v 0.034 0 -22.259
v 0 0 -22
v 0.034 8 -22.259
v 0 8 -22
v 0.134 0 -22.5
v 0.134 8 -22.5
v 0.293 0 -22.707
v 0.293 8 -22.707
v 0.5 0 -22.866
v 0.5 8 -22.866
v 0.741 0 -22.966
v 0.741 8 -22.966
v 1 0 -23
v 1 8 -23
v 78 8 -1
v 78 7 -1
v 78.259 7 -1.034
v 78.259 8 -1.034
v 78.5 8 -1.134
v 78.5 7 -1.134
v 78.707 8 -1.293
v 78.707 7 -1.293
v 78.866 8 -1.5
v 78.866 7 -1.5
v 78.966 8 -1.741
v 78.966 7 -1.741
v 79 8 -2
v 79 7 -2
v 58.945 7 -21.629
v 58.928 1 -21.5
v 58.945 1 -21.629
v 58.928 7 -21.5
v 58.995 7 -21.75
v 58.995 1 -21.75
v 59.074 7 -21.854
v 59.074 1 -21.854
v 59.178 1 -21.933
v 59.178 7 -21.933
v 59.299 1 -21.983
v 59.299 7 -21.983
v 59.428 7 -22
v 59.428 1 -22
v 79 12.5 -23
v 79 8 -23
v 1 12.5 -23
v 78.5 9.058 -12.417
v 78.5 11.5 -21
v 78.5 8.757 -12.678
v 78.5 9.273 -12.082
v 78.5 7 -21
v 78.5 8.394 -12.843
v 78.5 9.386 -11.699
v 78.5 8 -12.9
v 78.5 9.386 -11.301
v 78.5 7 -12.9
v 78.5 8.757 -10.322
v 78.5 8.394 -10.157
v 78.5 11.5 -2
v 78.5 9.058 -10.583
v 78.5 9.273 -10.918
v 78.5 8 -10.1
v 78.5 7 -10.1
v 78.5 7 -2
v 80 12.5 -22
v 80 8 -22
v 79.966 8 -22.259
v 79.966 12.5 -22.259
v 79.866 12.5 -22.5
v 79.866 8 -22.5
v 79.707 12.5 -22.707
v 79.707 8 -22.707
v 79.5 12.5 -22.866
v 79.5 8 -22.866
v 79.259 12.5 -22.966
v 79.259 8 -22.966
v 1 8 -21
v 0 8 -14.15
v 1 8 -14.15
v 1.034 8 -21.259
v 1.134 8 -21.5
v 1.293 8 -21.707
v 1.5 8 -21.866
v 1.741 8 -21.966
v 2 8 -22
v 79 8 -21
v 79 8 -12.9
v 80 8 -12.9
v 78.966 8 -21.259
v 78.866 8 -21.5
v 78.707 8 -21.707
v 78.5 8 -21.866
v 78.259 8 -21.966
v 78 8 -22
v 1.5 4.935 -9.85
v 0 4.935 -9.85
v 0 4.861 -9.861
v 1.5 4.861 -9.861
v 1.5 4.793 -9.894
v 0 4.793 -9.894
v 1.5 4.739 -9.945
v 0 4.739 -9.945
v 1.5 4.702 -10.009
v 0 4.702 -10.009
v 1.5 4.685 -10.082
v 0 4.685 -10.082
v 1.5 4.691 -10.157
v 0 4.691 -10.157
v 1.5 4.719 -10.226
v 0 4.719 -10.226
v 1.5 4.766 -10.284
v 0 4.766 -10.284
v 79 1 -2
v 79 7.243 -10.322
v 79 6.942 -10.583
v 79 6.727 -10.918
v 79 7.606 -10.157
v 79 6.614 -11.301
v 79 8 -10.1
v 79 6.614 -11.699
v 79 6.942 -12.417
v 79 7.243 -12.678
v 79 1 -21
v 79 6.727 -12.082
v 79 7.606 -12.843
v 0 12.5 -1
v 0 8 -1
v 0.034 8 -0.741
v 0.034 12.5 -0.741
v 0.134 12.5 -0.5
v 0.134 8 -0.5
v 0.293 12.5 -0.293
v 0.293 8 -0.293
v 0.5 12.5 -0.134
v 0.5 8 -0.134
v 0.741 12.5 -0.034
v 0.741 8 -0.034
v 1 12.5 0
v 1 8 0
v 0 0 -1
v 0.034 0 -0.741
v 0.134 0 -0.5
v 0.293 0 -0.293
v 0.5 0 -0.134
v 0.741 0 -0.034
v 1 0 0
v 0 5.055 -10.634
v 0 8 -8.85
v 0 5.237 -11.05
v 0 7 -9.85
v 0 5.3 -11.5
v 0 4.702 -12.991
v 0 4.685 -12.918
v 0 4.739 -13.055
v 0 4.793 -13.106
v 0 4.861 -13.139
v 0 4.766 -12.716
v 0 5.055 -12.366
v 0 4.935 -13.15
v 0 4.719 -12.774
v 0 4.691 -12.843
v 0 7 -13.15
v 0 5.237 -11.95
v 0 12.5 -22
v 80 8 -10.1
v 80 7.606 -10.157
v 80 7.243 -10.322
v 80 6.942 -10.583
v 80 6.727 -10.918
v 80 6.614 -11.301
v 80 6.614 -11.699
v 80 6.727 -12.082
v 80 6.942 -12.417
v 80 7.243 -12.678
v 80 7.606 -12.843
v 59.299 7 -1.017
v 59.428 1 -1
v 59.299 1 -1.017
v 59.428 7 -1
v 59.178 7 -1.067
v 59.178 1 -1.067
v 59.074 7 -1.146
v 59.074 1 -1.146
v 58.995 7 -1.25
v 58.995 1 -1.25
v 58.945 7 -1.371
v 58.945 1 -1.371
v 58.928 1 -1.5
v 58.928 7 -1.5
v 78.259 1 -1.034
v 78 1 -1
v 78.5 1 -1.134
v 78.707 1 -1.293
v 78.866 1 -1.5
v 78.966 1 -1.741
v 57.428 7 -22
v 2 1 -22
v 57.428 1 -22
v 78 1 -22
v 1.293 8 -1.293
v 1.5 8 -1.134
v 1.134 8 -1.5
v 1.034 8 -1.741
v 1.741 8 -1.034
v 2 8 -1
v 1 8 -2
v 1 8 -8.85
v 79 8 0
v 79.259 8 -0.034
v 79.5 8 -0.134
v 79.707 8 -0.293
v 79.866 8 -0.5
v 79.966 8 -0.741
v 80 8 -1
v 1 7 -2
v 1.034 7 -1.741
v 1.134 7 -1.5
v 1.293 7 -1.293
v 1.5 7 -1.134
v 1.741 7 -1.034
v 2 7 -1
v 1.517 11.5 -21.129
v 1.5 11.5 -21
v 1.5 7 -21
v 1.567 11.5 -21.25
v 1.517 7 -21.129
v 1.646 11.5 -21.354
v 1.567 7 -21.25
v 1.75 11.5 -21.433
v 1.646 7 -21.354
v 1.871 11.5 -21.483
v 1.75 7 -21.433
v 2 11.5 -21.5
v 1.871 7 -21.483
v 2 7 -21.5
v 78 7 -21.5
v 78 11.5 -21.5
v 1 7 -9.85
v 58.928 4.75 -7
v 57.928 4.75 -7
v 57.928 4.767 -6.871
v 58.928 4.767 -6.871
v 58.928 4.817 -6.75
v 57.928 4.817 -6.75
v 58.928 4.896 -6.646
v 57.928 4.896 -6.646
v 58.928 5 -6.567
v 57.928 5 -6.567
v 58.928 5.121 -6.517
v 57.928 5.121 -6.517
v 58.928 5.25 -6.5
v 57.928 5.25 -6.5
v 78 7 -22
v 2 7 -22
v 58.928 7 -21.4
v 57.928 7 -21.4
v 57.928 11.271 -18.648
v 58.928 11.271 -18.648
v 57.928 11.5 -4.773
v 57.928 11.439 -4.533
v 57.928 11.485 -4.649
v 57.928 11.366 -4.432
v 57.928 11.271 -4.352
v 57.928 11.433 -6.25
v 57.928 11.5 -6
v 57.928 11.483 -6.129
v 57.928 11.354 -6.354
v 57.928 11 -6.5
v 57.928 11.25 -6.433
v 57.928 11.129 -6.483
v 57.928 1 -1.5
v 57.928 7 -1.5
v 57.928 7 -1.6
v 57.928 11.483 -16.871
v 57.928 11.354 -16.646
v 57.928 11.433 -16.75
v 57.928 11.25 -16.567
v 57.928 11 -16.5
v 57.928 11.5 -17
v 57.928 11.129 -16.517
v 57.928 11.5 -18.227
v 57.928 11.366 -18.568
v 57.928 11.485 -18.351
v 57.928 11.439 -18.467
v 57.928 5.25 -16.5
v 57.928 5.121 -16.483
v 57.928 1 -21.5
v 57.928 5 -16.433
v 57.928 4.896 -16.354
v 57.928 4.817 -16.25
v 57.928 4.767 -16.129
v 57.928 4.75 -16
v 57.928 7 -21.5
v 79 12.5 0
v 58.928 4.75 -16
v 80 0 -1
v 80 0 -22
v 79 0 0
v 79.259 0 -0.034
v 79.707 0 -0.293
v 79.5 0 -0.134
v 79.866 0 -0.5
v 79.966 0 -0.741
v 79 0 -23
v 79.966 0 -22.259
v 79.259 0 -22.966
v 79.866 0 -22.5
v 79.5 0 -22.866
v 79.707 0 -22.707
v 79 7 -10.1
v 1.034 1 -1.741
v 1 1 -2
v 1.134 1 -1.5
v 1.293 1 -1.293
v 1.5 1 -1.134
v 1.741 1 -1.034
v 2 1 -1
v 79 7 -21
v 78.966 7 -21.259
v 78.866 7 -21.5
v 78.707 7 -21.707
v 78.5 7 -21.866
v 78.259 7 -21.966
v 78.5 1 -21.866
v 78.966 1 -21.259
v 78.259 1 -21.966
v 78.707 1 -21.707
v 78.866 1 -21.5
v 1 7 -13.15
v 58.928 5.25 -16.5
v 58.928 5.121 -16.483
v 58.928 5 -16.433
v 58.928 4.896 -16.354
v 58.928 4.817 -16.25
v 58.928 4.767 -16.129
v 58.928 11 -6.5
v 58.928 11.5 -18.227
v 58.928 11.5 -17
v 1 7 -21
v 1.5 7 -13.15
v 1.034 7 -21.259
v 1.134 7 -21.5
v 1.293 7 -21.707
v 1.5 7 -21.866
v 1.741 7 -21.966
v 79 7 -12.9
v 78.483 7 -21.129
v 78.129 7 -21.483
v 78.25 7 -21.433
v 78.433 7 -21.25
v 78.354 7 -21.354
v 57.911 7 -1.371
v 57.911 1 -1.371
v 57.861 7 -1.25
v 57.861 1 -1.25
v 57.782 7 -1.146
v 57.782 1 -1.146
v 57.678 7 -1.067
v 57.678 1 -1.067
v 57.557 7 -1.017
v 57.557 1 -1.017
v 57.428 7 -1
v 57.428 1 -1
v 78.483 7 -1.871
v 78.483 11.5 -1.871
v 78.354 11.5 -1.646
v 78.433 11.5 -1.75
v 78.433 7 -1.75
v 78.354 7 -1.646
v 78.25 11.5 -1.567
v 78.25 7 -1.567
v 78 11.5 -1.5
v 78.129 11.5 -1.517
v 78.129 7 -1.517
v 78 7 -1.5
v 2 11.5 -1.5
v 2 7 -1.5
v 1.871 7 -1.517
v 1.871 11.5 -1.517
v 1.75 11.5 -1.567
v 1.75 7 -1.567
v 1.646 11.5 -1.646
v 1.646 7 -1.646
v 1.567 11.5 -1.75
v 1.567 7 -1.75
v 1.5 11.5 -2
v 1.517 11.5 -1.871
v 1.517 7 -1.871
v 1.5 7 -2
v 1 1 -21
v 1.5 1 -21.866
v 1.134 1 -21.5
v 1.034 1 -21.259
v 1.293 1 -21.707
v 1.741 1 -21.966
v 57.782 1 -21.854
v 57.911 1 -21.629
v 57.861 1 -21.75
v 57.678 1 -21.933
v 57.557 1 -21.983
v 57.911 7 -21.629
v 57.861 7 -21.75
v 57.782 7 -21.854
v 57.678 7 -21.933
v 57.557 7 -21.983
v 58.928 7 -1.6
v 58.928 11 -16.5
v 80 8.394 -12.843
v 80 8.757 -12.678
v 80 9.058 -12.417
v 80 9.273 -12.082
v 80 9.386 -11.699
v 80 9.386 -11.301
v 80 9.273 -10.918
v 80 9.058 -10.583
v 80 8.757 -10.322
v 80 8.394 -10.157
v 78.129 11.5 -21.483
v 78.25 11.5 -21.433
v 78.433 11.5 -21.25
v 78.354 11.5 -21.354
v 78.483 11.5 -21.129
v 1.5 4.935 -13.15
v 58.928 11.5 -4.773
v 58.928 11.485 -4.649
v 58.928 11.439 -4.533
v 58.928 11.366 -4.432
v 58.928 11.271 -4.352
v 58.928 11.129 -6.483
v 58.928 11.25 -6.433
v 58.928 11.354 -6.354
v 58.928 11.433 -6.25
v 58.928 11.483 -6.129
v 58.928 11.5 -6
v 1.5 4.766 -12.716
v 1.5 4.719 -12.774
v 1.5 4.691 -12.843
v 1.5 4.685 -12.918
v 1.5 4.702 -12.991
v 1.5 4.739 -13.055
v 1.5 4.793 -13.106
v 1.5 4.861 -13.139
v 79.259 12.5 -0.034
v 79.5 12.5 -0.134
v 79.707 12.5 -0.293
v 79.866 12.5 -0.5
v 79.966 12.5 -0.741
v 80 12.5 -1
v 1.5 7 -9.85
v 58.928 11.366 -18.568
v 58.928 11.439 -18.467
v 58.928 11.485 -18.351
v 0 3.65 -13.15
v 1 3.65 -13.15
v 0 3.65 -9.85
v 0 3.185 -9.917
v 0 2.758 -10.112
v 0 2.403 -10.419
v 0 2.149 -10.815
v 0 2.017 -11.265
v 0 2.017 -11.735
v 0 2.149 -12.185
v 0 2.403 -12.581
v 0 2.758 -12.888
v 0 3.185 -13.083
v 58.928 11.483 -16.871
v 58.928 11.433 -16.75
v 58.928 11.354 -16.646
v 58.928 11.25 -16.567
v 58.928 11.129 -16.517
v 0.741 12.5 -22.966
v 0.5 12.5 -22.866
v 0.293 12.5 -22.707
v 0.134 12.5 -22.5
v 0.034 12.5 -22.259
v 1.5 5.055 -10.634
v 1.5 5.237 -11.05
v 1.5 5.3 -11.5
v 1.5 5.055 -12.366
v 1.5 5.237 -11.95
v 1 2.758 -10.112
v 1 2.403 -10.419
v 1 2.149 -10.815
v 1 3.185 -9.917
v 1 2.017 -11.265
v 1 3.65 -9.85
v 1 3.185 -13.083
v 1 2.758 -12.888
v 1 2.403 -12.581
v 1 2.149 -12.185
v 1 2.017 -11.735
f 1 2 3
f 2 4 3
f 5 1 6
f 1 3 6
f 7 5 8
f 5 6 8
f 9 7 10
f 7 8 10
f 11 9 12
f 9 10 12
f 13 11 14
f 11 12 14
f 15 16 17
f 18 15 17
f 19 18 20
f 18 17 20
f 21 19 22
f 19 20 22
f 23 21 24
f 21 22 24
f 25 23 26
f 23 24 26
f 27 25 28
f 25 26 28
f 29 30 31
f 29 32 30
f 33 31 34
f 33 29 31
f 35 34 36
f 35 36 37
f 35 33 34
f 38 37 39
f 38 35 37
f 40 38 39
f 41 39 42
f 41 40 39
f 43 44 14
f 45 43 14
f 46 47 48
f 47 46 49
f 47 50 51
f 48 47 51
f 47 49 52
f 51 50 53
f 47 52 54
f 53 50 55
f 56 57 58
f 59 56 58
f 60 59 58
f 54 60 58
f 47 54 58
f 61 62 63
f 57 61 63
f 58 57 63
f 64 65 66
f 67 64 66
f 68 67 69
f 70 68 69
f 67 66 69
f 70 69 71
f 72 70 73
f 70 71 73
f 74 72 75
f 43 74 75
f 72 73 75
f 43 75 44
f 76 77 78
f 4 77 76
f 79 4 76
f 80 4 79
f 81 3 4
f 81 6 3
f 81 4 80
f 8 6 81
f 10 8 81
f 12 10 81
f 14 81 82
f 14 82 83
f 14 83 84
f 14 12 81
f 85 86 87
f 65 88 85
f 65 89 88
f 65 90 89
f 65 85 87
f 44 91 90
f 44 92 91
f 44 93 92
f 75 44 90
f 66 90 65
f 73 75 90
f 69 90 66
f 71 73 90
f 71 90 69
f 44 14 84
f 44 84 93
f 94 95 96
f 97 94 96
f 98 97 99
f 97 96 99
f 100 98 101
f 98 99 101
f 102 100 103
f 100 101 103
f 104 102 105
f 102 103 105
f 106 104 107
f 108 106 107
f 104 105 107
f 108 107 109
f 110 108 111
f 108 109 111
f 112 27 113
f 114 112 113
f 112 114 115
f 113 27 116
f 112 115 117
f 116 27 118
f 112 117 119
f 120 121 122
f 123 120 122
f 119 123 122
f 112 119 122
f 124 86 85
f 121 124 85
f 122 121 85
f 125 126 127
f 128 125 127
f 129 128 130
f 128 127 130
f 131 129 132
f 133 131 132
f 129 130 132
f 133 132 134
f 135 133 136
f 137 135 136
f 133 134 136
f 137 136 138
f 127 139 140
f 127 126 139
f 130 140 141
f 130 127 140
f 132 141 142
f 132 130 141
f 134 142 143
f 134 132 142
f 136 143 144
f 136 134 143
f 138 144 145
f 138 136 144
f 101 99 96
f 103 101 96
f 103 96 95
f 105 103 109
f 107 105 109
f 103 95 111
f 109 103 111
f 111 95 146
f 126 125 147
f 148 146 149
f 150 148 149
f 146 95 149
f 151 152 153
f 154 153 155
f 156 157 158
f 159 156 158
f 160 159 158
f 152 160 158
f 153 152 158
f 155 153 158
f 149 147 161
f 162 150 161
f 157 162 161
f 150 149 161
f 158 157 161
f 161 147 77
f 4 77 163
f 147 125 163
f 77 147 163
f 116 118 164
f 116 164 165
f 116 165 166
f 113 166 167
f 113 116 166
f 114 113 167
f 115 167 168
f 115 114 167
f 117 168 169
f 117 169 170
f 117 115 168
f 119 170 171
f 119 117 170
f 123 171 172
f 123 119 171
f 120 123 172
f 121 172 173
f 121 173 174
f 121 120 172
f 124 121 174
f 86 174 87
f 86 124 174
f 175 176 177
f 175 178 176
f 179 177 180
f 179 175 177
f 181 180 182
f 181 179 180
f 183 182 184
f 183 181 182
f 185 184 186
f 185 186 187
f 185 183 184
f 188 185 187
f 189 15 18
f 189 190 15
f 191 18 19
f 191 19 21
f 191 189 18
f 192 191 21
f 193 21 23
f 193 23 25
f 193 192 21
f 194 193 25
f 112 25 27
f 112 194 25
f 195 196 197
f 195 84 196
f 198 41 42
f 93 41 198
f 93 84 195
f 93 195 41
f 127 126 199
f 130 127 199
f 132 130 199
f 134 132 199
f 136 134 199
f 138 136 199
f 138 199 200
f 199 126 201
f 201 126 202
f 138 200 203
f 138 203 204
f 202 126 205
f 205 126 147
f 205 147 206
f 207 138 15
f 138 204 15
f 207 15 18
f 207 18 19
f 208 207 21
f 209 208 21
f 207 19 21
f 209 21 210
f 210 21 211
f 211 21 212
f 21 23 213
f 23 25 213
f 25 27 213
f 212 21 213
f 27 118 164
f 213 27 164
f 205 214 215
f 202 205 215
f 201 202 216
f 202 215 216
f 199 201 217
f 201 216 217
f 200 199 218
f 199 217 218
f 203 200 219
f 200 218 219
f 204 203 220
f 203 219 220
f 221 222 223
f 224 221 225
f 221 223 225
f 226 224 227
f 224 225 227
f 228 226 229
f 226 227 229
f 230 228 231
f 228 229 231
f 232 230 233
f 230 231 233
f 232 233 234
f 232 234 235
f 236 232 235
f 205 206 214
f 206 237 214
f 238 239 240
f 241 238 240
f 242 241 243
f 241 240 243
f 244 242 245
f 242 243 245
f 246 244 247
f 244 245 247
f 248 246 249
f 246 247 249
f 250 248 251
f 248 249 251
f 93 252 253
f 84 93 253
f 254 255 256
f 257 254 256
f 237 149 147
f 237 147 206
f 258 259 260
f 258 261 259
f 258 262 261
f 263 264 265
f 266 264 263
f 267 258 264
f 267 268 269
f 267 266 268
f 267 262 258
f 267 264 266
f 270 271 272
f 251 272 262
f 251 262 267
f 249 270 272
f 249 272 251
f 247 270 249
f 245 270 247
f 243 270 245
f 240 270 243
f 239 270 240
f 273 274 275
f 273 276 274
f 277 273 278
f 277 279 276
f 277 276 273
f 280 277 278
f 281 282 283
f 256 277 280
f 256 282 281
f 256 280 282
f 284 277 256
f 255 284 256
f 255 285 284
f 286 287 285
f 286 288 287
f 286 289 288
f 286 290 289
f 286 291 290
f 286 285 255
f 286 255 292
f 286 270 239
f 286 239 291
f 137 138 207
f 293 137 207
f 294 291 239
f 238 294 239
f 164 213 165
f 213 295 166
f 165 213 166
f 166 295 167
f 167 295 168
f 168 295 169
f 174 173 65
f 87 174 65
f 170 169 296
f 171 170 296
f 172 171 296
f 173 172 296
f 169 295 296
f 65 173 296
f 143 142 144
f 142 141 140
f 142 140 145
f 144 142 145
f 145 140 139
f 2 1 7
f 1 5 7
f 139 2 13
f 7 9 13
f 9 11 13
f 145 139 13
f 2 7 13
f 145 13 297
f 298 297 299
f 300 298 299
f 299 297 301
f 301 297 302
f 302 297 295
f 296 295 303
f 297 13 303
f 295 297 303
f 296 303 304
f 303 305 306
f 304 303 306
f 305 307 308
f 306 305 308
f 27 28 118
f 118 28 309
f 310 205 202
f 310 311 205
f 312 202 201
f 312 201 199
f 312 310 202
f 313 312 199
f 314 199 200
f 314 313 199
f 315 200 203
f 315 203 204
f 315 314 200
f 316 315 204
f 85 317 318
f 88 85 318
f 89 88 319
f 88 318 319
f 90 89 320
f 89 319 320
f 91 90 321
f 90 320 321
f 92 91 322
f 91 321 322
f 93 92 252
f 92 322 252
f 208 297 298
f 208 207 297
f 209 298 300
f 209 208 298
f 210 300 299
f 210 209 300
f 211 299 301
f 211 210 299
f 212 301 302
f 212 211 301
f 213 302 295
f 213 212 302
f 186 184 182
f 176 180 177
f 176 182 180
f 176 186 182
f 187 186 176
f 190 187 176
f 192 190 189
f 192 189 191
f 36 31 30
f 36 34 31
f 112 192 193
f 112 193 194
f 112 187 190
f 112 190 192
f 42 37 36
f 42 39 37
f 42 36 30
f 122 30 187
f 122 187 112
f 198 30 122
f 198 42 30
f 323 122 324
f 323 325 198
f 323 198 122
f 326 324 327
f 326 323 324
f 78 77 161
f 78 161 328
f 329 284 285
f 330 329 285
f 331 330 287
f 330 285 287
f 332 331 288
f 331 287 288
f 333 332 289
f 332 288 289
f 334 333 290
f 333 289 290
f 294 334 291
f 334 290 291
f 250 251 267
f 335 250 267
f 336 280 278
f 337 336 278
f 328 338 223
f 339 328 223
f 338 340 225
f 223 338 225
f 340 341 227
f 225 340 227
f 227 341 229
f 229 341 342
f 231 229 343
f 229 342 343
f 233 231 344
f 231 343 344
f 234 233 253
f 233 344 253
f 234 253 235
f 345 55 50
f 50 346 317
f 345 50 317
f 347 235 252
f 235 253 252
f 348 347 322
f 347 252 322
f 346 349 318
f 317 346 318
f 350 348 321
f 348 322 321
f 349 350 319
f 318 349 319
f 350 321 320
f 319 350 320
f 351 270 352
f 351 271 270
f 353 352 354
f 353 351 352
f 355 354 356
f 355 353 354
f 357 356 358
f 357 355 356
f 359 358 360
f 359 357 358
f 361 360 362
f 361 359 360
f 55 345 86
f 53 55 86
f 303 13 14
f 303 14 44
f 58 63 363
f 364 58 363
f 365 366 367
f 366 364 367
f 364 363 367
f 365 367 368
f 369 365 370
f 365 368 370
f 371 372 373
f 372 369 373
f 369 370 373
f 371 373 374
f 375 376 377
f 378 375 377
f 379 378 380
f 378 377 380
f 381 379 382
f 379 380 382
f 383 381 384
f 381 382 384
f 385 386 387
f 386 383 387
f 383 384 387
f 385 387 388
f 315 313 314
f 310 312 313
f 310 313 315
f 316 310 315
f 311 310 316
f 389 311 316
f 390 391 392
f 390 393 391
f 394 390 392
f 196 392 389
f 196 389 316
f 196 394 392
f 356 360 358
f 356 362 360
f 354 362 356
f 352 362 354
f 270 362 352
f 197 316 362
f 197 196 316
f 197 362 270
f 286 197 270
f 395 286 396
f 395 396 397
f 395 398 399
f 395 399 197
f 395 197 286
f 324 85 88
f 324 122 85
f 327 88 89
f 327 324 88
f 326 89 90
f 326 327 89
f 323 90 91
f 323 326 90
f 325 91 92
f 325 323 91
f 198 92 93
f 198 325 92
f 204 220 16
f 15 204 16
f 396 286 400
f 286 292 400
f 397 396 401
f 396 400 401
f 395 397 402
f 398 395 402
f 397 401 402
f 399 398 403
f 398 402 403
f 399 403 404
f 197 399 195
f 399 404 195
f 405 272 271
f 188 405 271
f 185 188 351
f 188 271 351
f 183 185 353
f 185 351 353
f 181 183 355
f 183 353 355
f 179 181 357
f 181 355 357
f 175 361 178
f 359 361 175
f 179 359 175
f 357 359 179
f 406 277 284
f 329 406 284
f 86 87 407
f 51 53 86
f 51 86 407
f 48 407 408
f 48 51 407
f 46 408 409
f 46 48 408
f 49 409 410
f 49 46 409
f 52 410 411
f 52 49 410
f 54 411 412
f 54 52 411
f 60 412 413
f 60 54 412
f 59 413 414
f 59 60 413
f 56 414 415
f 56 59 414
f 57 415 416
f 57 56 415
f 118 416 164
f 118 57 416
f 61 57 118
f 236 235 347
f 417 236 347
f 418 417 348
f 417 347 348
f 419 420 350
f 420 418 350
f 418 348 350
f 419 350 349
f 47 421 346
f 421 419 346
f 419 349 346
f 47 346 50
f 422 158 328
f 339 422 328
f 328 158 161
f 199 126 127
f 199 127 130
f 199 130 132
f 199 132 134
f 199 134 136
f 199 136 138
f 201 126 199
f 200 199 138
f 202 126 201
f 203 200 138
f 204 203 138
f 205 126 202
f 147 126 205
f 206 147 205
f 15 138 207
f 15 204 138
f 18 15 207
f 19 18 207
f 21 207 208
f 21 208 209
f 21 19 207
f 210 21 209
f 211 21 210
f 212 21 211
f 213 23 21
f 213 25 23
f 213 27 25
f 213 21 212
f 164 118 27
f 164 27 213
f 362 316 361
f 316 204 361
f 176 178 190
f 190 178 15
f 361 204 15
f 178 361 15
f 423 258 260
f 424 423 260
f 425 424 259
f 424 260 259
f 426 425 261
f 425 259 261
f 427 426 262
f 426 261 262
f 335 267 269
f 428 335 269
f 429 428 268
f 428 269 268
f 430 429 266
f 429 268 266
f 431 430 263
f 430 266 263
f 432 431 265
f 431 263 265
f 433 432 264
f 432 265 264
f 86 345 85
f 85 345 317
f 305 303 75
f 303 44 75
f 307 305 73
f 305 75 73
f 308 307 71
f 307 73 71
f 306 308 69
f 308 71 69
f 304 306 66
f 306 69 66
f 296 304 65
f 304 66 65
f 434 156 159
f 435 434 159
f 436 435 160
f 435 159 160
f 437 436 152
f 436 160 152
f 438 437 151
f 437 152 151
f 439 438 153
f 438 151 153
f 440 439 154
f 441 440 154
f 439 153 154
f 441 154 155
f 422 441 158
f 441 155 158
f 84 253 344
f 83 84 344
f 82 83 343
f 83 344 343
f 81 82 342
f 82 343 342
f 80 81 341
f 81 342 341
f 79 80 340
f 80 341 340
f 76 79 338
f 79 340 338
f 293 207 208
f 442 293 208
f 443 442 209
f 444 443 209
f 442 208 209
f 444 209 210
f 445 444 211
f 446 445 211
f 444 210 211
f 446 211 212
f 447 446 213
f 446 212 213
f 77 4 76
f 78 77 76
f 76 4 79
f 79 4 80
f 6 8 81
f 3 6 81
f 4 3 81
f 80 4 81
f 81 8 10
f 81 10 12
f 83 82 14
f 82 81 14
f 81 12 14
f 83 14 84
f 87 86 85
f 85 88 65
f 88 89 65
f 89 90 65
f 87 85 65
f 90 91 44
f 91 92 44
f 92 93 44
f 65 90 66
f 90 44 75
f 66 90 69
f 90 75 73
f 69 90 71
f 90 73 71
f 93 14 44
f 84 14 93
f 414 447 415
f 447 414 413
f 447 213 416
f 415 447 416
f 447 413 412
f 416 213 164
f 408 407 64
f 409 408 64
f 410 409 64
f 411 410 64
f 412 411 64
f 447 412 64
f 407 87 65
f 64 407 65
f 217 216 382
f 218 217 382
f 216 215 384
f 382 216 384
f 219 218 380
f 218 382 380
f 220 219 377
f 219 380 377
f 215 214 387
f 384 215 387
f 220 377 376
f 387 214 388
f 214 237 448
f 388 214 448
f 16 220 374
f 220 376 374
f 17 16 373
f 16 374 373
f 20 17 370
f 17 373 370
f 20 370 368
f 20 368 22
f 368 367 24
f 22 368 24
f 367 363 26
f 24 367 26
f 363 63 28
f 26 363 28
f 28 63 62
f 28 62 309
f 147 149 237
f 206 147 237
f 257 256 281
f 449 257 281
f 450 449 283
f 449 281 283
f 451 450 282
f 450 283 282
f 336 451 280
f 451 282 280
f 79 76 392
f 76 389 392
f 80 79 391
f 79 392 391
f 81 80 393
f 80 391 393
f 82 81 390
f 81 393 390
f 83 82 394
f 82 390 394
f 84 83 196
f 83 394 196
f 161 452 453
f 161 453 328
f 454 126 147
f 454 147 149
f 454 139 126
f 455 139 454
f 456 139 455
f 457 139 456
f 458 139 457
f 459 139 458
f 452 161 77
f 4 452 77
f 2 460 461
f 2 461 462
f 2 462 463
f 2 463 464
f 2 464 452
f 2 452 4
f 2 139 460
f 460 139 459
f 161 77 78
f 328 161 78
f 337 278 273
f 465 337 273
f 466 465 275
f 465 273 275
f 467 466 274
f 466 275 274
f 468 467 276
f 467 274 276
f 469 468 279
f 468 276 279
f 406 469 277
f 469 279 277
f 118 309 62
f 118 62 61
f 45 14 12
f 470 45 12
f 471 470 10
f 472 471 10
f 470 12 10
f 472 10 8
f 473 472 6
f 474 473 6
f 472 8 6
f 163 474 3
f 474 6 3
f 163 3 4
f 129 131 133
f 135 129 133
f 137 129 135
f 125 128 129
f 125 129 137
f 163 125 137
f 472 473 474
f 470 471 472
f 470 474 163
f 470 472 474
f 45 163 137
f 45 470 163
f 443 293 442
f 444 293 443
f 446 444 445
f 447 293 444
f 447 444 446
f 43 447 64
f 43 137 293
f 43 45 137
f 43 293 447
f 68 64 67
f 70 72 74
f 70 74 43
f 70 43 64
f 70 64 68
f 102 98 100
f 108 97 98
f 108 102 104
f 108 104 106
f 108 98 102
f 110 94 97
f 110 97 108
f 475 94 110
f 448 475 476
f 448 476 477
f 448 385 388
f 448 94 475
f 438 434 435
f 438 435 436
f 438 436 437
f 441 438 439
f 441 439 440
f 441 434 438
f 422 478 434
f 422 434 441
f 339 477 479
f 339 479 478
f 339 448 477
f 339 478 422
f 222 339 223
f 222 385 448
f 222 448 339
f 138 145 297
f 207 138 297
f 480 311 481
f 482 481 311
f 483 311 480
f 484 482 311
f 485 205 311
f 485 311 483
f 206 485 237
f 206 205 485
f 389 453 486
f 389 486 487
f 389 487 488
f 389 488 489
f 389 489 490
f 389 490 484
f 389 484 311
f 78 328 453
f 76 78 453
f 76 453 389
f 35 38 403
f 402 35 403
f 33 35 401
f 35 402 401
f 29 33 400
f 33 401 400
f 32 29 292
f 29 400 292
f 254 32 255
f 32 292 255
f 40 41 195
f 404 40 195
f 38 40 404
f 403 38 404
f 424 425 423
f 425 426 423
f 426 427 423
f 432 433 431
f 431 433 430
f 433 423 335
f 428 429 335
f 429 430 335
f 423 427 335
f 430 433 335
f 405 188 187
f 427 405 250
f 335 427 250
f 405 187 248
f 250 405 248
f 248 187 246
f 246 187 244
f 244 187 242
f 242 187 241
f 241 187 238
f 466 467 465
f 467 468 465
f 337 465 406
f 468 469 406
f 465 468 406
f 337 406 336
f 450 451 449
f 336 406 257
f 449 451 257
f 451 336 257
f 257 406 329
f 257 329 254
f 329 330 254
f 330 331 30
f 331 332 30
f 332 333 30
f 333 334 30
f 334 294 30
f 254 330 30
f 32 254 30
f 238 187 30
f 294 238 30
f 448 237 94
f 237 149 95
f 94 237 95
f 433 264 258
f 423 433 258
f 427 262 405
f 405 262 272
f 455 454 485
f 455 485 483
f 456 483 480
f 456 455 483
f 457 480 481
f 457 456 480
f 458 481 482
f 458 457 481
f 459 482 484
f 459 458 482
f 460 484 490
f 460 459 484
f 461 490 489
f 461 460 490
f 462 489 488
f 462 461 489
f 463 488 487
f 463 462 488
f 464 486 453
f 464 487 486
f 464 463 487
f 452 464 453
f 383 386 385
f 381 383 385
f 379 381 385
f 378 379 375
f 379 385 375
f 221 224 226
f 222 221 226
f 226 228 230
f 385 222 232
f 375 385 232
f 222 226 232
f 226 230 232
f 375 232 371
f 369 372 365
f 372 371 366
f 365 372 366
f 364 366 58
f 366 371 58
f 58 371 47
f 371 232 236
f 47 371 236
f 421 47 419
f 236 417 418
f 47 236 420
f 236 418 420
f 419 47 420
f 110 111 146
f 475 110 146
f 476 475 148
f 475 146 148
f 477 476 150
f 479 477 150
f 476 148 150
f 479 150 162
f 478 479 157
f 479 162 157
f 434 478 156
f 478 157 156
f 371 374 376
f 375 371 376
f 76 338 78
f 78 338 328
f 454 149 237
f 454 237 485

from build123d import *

# Parameters (mm, degrees)
SKETCH1_W           = 80
SKETCH1_H           = 23
BOSS_EXTRUDE1_DEPTH = 8
SKETCH2_W           = 78
SKETCH2_H           = 21
CUT_EXTRUDE1_DEPTH  = 7
CUT_EXTRUDE2_REACH  = 85.624
FILLET1_R           = 1
BOSS_EXTRUDE3_DEPTH = 4.5
CUT_EXTRUDE4_DEPTH  = 3.5
BOSS_EXTRUDE4_START = -1
BOSS_EXTRUDE4_DEPTH = 1
CUT_EXTRUDE3_START  = -1.5
SKETCH4_R           = 1.4
CUT_EXTRUDE3_DEPTH  = 1.5
BOSS_EXTRUDE5_DEPTH = 1.5
SKETCH4_3_W         = 2.8
SKETCH4_3_H         = 1.4
CUT_EXTRUDE19_DEPTH = 1.5
CHAMFER2_SIZE       = 1
CHAMFER3_SIZE       = 1
SKETCH7_W           = 1
SKETCH7_H           = 21
BOSS_EXTRUDE6_DEPTH = 10.5
CUT_EXTRUDE20_DEPTH = 1
FILLET2_R           = 0.5


with BuildPart() as part:
    # Sketch1 → Boss-Extrude1 (new body)
    with BuildSketch(Plane(origin=(0, 0, 0), x_dir=(1, 0, 0), z_dir=(0, 1, 0))):
        with Locations((40, 11.5)):
            Rectangle(SKETCH1_W, SKETCH1_H)
    extrude(amount=BOSS_EXTRUDE1_DEPTH)

    # Sketch2 → Cut-Extrude1 (cut)
    with BuildSketch(Plane(origin=(0, 8, 0), x_dir=(1, 0, 0), z_dir=(0, 1, 0))):
        with Locations((40, 11.5)):
            Rectangle(SKETCH2_W, SKETCH2_H)
    extrude(amount=-CUT_EXTRUDE1_DEPTH, mode=Mode.SUBTRACT)

    # Sketch3 → Cut-Extrude2 (cut, up to next)
    with BuildSketch(Plane(origin=(0, 0, 0), x_dir=(0, 0, -1), z_dir=(1, 0, 0)), mode=Mode.PRIVATE) as cut_extrude2_sk1:
        with BuildLine():
            ThreePointArc((12.715789474, 4.76550704), (12.990684531, 4.701550479), (13.15, 4.934523258))
            Line((13.15, 4.934523258), (13.15, 8))
            Line((13.15, 8), (9.85, 8))
            Line((9.85, 8), (9.85, 4.934523258))
            ThreePointArc((9.85, 4.934523258), (10.009315469, 4.701550479), (10.284210526, 4.76550704))
            ThreePointArc((10.284210526, 4.76550704), (11.5, 5.3), (12.715789474, 4.76550704))
        make_face()
    cut_extrude2_tool1 = extrude(cut_extrude2_sk1.sketch, amount=CUT_EXTRUDE2_REACH, mode=Mode.PRIVATE) & part.part
    # Sketch3 → Cut-Extrude2 (cut, up to next)
    with BuildSketch(Plane(origin=(0, 0, 0), x_dir=(0, 0, -1), z_dir=(1, 0, 0)), mode=Mode.PRIVATE) as cut_extrude2_sk2:
        with BuildLine():
            ThreePointArc((12.715789474, 4.76550704), (13.037620342, 4.248517906), (13.15, 3.65))
            Line((13.15, 3.65), (13.15, 4.934523258))
            ThreePointArc((13.15, 4.934523258), (12.990684531, 4.701550479), (12.715789474, 4.76550704))
        make_face()
    cut_extrude2_tool2 = extrude(cut_extrude2_sk2.sketch, amount=CUT_EXTRUDE2_REACH, mode=Mode.PRIVATE) & part.part
    # Sketch3 → Cut-Extrude2 (cut, up to next)
    with BuildSketch(Plane(origin=(0, 0, 0), x_dir=(0, 0, -1), z_dir=(1, 0, 0)), mode=Mode.PRIVATE) as cut_extrude2_sk3:
        with BuildLine():
            Line((9.85, 4.934523258), (9.85, 3.65))
            ThreePointArc((9.85, 3.65), (9.962379658, 4.248517906), (10.284210526, 4.76550704))
            ThreePointArc((10.284210526, 4.76550704), (10.009315469, 4.701550479), (9.85, 4.934523258))
        make_face()
    cut_extrude2_tool3 = extrude(cut_extrude2_sk3.sketch, amount=CUT_EXTRUDE2_REACH, mode=Mode.PRIVATE) & part.part
    # Sketch3 → Cut-Extrude2 (cut, up to next)
    with BuildSketch(Plane(origin=(0, 0, 0), x_dir=(0, 0, -1), z_dir=(1, 0, 0)), mode=Mode.PRIVATE) as cut_extrude2_sk4:
        with BuildLine():
            ThreePointArc((9.85, 3.65), (11.5, 2), (13.15, 3.65))
            ThreePointArc((13.15, 3.65), (11.5, 5.3), (9.85, 3.65))
        make_face()
    cut_extrude2_tool4 = extrude(cut_extrude2_sk4.sketch, amount=CUT_EXTRUDE2_REACH, mode=Mode.PRIVATE) & part.part
    add(cut_extrude2_tool1.solids().sort_by_distance((0, 6.505264, -11.5))[0], mode=Mode.SUBTRACT)
    add(cut_extrude2_tool2.solids().sort_by_distance((0, 4.466098, -13.044987))[0], mode=Mode.SUBTRACT)
    add(cut_extrude2_tool3.solids().sort_by_distance((0, 4.466098, -9.955013))[0], mode=Mode.SUBTRACT)
    add(cut_extrude2_tool4.solids().sort_by_distance((0, 3.65, -11.5))[0], mode=Mode.SUBTRACT)

    # Fillet1
    fillet1_edges = [part.edges().sort_by_distance(p)[0] for p in [
        (79, 4.5, -1),
        (1, 4.5, -1),
        (1, 4.5, -22),
        (79, 4.5, -22),
        (0, 4, -23),
        (80, 4, -23),
        (80, 4, 0),
        (0, 4, 0),
    ]]
    fillet(fillet1_edges, radius=FILLET1_R)


with BuildPart() as body_2:
    # Sketch6 → Boss-Extrude3 (new body)
    with BuildSketch(Plane(origin=(0, 8, 0), x_dir=(1, 0, 0), z_dir=(0, 1, 0))):
        with BuildLine():
            ThreePointArc((79, 0), (79.707106781, 0.292893219), (80, 1))
            Line((80, 1), (80, 22))
            ThreePointArc((80, 22), (79.707106781, 22.707106781), (79, 23))
            Line((79, 23), (1, 23))
            ThreePointArc((1, 23), (0.292893219, 22.707106781), (0, 22))
            Line((0, 22), (0, 1))
            ThreePointArc((0, 1), (0.292893219, 0.292893219), (1, 0))
            Line((1, 0), (79, 0))
        make_face()
    extrude(amount=BOSS_EXTRUDE3_DEPTH)

    # Sketch6<3> → Cut-Extrude4 (cut)
    with BuildSketch(Plane(origin=(0, 8, 0), x_dir=(1, 0, 0), z_dir=(0, 1, 0))):
        with BuildLine():
            Line((1.5, 21), (1.5, 2))
            ThreePointArc((1.5, 2), (1.646446609, 1.646446609), (2, 1.5))
            Line((2, 1.5), (78, 1.5))
            ThreePointArc((78, 1.5), (78.353553391, 1.646446609), (78.5, 2))
            Line((78.5, 2), (78.5, 21))
            ThreePointArc((78.5, 21), (78.353553391, 21.353553391), (78, 21.5))
            Line((78, 21.5), (2, 21.5))
            ThreePointArc((2, 21.5), (1.646446609, 21.353553391), (1.5, 21))
        make_face()
    extrude(amount=CUT_EXTRUDE4_DEPTH, mode=Mode.SUBTRACT)

    # Sketch6<4> → Boss-Extrude4 (add)
    with BuildSketch(Plane(origin=(0, 8, 0), x_dir=(1, 0, 0), z_dir=(0, 1, 0)).offset(BOSS_EXTRUDE4_START)):
        with BuildLine():
            ThreePointArc((1, 2), (1.292893219, 1.292893219), (2, 1))
            Line((2, 1), (78, 1))
            ThreePointArc((78, 1), (78.707106781, 1.292893219), (79, 2))
            Line((79, 2), (79, 21))
            ThreePointArc((79, 21), (78.707106781, 21.707106781), (78, 22))
            Line((78, 22), (2, 22))
            ThreePointArc((2, 22), (1.292893219, 21.707106781), (1, 21))
            Line((1, 21), (1, 13.15))
            Line((1, 13.15), (1, 9.85))
            Line((1, 9.85), (1, 2))
        make_face()
        with BuildLine():
            Line((78, 1.5), (2, 1.5))
            ThreePointArc((2, 1.5), (1.646446609, 1.646446609), (1.5, 2))
            Line((1.5, 2), (1.5, 21))
            ThreePointArc((1.5, 21), (1.646446609, 21.353553391), (2, 21.5))
            Line((2, 21.5), (78, 21.5))
            ThreePointArc((78, 21.5), (78.353553391, 21.353553391), (78.5, 21))
            Line((78.5, 21), (78.5, 2))
            ThreePointArc((78.5, 2), (78.353553391, 1.646446609), (78, 1.5))
        make_face(mode=Mode.SUBTRACT)
    extrude(amount=BOSS_EXTRUDE4_DEPTH)


with BuildPart() as cut_extrude3_tool:
    # Sketch4 → Cut-Extrude3 (new body)
    with BuildSketch(Plane(origin=(80, 0, 0), x_dir=(0, 0, -1), z_dir=(1, 0, 0)).offset(CUT_EXTRUDE3_START)):
        with Locations((11.5, 8)):
            Circle(SKETCH4_R)
    extrude(amount=CUT_EXTRUDE3_DEPTH)


with BuildPart() as part_1:
    add(part.part)

    # Cut-Extrude3: cut by cut_extrude3_tool
    add(cut_extrude3_tool.part, mode=Mode.SUBTRACT)

    # Chamfer2
    chamfer2_edges = [part_1.edges().sort_by_distance(p)[0] for p in [
        (0.5, 8, -9.85),
        (0.5, 8, -13.15),
    ]]
    chamfer(chamfer2_edges, length=CHAMFER2_SIZE)

    # Sketch7 → Boss-Extrude6 (add)
    with BuildSketch(Plane(origin=(0, 1, 0), x_dir=(1, 0, 0), z_dir=(0, 1, 0))):
        with Locations((58.428, 11.5)):
            Rectangle(SKETCH7_W, SKETCH7_H)
    extrude(amount=BOSS_EXTRUDE6_DEPTH)

    # Sketch8 → Cut-Extrude20 (cut)
    with BuildSketch(Plane.ZY.offset(-57.928)):
        with BuildLine():
            Line((-16, 4.75), (-7, 4.75))
            ThreePointArc((-7, 4.75), (-6.646446609, 4.896446609), (-6.5, 5.25))
            Line((-6.5, 5.25), (-6.5, 11))
            ThreePointArc((-6.5, 11), (-6.353553391, 11.353553391), (-6, 11.5))
            Line((-6, 11.5), (-4.772611503, 11.5))
            ThreePointArc((-4.772611503, 11.5), (-4.533263778, 11.438990509), (-4.352325985, 11.270850667))
            Line((-4.352325985, 11.270850667), (-1.6, 7))
            Line((-1.6, 7), (-1, 7))
            Line((-1, 7), (-1, 13.527800593))
            Line((-1, 13.527800593), (-22, 13.527800593))
            Line((-22, 13.527800593), (-22, 11.5))
            Line((-22, 11.5), (-22, 7))
            Line((-22, 7), (-21.4, 7))
            Line((-21.4, 7), (-18.647674015, 11.270850667))
            ThreePointArc((-18.647674015, 11.270850667), (-18.466736222, 11.438990509), (-18.227388497, 11.5))
            Line((-18.227388497, 11.5), (-17, 11.5))
            ThreePointArc((-17, 11.5), (-16.646446609, 11.353553391), (-16.5, 11))
            Line((-16.5, 11), (-16.5, 5.25))
            ThreePointArc((-16.5, 5.25), (-16.353553391, 4.896446609), (-16, 4.75))
        make_face()
    extrude(amount=-CUT_EXTRUDE20_DEPTH, mode=Mode.SUBTRACT)

    # Fillet2
    fillet2_edges = [part_1.edges().sort_by_distance(p)[0] for p in [
        (57.928, 4, -1),
        (58.928, 4, -1),
        (57.928, 4, -22),
        (58.928, 4, -22),
    ]]
    fillet(fillet2_edges, radius=FILLET2_R)


with BuildPart() as body_2_1:
    add(body_2.part)

    # Cut-Extrude3: cut by cut_extrude3_tool
    add(cut_extrude3_tool.part, mode=Mode.SUBTRACT)

    # Sketch3<3> → Boss-Extrude5 (add)
    with BuildSketch(Plane(origin=(0, 0, 0), x_dir=(0, 0, -1), z_dir=(1, 0, 0))):
        with BuildLine():
            ThreePointArc((12.715789474, 4.76550704), (12.990684531, 4.701550479), (13.15, 4.934523258))
            Line((13.15, 4.934523258), (13.15, 8))
            Line((13.15, 8), (9.85, 8))
            Line((9.85, 8), (9.85, 4.934523258))
            ThreePointArc((9.85, 4.934523258), (10.009315469, 4.701550479), (10.284210526, 4.76550704))
            ThreePointArc((10.284210526, 4.76550704), (11.5, 5.3), (12.715789474, 4.76550704))
        make_face()
    extrude(amount=BOSS_EXTRUDE5_DEPTH)

    # Sketch4<3> → Cut-Extrude19 (cut)
    with BuildSketch(Plane(origin=(80, 0, 0), x_dir=(0, 0, -1), z_dir=(1, 0, 0))):
        with Locations((11.5, 7.3)):
            Rectangle(SKETCH4_3_W, SKETCH4_3_H)
    extrude(amount=-CUT_EXTRUDE19_DEPTH, mode=Mode.SUBTRACT)

    # Chamfer3
    chamfer3_edges = [body_2_1.edges().sort_by_distance(p)[0] for p in [
        (0.5, 8, -9.85),
        (0.5, 8, -13.15),
    ]]
    chamfer(chamfer3_edges, length=CHAMFER3_SIZE)


solid = Compound([part_1.part, body_2_1.part])
